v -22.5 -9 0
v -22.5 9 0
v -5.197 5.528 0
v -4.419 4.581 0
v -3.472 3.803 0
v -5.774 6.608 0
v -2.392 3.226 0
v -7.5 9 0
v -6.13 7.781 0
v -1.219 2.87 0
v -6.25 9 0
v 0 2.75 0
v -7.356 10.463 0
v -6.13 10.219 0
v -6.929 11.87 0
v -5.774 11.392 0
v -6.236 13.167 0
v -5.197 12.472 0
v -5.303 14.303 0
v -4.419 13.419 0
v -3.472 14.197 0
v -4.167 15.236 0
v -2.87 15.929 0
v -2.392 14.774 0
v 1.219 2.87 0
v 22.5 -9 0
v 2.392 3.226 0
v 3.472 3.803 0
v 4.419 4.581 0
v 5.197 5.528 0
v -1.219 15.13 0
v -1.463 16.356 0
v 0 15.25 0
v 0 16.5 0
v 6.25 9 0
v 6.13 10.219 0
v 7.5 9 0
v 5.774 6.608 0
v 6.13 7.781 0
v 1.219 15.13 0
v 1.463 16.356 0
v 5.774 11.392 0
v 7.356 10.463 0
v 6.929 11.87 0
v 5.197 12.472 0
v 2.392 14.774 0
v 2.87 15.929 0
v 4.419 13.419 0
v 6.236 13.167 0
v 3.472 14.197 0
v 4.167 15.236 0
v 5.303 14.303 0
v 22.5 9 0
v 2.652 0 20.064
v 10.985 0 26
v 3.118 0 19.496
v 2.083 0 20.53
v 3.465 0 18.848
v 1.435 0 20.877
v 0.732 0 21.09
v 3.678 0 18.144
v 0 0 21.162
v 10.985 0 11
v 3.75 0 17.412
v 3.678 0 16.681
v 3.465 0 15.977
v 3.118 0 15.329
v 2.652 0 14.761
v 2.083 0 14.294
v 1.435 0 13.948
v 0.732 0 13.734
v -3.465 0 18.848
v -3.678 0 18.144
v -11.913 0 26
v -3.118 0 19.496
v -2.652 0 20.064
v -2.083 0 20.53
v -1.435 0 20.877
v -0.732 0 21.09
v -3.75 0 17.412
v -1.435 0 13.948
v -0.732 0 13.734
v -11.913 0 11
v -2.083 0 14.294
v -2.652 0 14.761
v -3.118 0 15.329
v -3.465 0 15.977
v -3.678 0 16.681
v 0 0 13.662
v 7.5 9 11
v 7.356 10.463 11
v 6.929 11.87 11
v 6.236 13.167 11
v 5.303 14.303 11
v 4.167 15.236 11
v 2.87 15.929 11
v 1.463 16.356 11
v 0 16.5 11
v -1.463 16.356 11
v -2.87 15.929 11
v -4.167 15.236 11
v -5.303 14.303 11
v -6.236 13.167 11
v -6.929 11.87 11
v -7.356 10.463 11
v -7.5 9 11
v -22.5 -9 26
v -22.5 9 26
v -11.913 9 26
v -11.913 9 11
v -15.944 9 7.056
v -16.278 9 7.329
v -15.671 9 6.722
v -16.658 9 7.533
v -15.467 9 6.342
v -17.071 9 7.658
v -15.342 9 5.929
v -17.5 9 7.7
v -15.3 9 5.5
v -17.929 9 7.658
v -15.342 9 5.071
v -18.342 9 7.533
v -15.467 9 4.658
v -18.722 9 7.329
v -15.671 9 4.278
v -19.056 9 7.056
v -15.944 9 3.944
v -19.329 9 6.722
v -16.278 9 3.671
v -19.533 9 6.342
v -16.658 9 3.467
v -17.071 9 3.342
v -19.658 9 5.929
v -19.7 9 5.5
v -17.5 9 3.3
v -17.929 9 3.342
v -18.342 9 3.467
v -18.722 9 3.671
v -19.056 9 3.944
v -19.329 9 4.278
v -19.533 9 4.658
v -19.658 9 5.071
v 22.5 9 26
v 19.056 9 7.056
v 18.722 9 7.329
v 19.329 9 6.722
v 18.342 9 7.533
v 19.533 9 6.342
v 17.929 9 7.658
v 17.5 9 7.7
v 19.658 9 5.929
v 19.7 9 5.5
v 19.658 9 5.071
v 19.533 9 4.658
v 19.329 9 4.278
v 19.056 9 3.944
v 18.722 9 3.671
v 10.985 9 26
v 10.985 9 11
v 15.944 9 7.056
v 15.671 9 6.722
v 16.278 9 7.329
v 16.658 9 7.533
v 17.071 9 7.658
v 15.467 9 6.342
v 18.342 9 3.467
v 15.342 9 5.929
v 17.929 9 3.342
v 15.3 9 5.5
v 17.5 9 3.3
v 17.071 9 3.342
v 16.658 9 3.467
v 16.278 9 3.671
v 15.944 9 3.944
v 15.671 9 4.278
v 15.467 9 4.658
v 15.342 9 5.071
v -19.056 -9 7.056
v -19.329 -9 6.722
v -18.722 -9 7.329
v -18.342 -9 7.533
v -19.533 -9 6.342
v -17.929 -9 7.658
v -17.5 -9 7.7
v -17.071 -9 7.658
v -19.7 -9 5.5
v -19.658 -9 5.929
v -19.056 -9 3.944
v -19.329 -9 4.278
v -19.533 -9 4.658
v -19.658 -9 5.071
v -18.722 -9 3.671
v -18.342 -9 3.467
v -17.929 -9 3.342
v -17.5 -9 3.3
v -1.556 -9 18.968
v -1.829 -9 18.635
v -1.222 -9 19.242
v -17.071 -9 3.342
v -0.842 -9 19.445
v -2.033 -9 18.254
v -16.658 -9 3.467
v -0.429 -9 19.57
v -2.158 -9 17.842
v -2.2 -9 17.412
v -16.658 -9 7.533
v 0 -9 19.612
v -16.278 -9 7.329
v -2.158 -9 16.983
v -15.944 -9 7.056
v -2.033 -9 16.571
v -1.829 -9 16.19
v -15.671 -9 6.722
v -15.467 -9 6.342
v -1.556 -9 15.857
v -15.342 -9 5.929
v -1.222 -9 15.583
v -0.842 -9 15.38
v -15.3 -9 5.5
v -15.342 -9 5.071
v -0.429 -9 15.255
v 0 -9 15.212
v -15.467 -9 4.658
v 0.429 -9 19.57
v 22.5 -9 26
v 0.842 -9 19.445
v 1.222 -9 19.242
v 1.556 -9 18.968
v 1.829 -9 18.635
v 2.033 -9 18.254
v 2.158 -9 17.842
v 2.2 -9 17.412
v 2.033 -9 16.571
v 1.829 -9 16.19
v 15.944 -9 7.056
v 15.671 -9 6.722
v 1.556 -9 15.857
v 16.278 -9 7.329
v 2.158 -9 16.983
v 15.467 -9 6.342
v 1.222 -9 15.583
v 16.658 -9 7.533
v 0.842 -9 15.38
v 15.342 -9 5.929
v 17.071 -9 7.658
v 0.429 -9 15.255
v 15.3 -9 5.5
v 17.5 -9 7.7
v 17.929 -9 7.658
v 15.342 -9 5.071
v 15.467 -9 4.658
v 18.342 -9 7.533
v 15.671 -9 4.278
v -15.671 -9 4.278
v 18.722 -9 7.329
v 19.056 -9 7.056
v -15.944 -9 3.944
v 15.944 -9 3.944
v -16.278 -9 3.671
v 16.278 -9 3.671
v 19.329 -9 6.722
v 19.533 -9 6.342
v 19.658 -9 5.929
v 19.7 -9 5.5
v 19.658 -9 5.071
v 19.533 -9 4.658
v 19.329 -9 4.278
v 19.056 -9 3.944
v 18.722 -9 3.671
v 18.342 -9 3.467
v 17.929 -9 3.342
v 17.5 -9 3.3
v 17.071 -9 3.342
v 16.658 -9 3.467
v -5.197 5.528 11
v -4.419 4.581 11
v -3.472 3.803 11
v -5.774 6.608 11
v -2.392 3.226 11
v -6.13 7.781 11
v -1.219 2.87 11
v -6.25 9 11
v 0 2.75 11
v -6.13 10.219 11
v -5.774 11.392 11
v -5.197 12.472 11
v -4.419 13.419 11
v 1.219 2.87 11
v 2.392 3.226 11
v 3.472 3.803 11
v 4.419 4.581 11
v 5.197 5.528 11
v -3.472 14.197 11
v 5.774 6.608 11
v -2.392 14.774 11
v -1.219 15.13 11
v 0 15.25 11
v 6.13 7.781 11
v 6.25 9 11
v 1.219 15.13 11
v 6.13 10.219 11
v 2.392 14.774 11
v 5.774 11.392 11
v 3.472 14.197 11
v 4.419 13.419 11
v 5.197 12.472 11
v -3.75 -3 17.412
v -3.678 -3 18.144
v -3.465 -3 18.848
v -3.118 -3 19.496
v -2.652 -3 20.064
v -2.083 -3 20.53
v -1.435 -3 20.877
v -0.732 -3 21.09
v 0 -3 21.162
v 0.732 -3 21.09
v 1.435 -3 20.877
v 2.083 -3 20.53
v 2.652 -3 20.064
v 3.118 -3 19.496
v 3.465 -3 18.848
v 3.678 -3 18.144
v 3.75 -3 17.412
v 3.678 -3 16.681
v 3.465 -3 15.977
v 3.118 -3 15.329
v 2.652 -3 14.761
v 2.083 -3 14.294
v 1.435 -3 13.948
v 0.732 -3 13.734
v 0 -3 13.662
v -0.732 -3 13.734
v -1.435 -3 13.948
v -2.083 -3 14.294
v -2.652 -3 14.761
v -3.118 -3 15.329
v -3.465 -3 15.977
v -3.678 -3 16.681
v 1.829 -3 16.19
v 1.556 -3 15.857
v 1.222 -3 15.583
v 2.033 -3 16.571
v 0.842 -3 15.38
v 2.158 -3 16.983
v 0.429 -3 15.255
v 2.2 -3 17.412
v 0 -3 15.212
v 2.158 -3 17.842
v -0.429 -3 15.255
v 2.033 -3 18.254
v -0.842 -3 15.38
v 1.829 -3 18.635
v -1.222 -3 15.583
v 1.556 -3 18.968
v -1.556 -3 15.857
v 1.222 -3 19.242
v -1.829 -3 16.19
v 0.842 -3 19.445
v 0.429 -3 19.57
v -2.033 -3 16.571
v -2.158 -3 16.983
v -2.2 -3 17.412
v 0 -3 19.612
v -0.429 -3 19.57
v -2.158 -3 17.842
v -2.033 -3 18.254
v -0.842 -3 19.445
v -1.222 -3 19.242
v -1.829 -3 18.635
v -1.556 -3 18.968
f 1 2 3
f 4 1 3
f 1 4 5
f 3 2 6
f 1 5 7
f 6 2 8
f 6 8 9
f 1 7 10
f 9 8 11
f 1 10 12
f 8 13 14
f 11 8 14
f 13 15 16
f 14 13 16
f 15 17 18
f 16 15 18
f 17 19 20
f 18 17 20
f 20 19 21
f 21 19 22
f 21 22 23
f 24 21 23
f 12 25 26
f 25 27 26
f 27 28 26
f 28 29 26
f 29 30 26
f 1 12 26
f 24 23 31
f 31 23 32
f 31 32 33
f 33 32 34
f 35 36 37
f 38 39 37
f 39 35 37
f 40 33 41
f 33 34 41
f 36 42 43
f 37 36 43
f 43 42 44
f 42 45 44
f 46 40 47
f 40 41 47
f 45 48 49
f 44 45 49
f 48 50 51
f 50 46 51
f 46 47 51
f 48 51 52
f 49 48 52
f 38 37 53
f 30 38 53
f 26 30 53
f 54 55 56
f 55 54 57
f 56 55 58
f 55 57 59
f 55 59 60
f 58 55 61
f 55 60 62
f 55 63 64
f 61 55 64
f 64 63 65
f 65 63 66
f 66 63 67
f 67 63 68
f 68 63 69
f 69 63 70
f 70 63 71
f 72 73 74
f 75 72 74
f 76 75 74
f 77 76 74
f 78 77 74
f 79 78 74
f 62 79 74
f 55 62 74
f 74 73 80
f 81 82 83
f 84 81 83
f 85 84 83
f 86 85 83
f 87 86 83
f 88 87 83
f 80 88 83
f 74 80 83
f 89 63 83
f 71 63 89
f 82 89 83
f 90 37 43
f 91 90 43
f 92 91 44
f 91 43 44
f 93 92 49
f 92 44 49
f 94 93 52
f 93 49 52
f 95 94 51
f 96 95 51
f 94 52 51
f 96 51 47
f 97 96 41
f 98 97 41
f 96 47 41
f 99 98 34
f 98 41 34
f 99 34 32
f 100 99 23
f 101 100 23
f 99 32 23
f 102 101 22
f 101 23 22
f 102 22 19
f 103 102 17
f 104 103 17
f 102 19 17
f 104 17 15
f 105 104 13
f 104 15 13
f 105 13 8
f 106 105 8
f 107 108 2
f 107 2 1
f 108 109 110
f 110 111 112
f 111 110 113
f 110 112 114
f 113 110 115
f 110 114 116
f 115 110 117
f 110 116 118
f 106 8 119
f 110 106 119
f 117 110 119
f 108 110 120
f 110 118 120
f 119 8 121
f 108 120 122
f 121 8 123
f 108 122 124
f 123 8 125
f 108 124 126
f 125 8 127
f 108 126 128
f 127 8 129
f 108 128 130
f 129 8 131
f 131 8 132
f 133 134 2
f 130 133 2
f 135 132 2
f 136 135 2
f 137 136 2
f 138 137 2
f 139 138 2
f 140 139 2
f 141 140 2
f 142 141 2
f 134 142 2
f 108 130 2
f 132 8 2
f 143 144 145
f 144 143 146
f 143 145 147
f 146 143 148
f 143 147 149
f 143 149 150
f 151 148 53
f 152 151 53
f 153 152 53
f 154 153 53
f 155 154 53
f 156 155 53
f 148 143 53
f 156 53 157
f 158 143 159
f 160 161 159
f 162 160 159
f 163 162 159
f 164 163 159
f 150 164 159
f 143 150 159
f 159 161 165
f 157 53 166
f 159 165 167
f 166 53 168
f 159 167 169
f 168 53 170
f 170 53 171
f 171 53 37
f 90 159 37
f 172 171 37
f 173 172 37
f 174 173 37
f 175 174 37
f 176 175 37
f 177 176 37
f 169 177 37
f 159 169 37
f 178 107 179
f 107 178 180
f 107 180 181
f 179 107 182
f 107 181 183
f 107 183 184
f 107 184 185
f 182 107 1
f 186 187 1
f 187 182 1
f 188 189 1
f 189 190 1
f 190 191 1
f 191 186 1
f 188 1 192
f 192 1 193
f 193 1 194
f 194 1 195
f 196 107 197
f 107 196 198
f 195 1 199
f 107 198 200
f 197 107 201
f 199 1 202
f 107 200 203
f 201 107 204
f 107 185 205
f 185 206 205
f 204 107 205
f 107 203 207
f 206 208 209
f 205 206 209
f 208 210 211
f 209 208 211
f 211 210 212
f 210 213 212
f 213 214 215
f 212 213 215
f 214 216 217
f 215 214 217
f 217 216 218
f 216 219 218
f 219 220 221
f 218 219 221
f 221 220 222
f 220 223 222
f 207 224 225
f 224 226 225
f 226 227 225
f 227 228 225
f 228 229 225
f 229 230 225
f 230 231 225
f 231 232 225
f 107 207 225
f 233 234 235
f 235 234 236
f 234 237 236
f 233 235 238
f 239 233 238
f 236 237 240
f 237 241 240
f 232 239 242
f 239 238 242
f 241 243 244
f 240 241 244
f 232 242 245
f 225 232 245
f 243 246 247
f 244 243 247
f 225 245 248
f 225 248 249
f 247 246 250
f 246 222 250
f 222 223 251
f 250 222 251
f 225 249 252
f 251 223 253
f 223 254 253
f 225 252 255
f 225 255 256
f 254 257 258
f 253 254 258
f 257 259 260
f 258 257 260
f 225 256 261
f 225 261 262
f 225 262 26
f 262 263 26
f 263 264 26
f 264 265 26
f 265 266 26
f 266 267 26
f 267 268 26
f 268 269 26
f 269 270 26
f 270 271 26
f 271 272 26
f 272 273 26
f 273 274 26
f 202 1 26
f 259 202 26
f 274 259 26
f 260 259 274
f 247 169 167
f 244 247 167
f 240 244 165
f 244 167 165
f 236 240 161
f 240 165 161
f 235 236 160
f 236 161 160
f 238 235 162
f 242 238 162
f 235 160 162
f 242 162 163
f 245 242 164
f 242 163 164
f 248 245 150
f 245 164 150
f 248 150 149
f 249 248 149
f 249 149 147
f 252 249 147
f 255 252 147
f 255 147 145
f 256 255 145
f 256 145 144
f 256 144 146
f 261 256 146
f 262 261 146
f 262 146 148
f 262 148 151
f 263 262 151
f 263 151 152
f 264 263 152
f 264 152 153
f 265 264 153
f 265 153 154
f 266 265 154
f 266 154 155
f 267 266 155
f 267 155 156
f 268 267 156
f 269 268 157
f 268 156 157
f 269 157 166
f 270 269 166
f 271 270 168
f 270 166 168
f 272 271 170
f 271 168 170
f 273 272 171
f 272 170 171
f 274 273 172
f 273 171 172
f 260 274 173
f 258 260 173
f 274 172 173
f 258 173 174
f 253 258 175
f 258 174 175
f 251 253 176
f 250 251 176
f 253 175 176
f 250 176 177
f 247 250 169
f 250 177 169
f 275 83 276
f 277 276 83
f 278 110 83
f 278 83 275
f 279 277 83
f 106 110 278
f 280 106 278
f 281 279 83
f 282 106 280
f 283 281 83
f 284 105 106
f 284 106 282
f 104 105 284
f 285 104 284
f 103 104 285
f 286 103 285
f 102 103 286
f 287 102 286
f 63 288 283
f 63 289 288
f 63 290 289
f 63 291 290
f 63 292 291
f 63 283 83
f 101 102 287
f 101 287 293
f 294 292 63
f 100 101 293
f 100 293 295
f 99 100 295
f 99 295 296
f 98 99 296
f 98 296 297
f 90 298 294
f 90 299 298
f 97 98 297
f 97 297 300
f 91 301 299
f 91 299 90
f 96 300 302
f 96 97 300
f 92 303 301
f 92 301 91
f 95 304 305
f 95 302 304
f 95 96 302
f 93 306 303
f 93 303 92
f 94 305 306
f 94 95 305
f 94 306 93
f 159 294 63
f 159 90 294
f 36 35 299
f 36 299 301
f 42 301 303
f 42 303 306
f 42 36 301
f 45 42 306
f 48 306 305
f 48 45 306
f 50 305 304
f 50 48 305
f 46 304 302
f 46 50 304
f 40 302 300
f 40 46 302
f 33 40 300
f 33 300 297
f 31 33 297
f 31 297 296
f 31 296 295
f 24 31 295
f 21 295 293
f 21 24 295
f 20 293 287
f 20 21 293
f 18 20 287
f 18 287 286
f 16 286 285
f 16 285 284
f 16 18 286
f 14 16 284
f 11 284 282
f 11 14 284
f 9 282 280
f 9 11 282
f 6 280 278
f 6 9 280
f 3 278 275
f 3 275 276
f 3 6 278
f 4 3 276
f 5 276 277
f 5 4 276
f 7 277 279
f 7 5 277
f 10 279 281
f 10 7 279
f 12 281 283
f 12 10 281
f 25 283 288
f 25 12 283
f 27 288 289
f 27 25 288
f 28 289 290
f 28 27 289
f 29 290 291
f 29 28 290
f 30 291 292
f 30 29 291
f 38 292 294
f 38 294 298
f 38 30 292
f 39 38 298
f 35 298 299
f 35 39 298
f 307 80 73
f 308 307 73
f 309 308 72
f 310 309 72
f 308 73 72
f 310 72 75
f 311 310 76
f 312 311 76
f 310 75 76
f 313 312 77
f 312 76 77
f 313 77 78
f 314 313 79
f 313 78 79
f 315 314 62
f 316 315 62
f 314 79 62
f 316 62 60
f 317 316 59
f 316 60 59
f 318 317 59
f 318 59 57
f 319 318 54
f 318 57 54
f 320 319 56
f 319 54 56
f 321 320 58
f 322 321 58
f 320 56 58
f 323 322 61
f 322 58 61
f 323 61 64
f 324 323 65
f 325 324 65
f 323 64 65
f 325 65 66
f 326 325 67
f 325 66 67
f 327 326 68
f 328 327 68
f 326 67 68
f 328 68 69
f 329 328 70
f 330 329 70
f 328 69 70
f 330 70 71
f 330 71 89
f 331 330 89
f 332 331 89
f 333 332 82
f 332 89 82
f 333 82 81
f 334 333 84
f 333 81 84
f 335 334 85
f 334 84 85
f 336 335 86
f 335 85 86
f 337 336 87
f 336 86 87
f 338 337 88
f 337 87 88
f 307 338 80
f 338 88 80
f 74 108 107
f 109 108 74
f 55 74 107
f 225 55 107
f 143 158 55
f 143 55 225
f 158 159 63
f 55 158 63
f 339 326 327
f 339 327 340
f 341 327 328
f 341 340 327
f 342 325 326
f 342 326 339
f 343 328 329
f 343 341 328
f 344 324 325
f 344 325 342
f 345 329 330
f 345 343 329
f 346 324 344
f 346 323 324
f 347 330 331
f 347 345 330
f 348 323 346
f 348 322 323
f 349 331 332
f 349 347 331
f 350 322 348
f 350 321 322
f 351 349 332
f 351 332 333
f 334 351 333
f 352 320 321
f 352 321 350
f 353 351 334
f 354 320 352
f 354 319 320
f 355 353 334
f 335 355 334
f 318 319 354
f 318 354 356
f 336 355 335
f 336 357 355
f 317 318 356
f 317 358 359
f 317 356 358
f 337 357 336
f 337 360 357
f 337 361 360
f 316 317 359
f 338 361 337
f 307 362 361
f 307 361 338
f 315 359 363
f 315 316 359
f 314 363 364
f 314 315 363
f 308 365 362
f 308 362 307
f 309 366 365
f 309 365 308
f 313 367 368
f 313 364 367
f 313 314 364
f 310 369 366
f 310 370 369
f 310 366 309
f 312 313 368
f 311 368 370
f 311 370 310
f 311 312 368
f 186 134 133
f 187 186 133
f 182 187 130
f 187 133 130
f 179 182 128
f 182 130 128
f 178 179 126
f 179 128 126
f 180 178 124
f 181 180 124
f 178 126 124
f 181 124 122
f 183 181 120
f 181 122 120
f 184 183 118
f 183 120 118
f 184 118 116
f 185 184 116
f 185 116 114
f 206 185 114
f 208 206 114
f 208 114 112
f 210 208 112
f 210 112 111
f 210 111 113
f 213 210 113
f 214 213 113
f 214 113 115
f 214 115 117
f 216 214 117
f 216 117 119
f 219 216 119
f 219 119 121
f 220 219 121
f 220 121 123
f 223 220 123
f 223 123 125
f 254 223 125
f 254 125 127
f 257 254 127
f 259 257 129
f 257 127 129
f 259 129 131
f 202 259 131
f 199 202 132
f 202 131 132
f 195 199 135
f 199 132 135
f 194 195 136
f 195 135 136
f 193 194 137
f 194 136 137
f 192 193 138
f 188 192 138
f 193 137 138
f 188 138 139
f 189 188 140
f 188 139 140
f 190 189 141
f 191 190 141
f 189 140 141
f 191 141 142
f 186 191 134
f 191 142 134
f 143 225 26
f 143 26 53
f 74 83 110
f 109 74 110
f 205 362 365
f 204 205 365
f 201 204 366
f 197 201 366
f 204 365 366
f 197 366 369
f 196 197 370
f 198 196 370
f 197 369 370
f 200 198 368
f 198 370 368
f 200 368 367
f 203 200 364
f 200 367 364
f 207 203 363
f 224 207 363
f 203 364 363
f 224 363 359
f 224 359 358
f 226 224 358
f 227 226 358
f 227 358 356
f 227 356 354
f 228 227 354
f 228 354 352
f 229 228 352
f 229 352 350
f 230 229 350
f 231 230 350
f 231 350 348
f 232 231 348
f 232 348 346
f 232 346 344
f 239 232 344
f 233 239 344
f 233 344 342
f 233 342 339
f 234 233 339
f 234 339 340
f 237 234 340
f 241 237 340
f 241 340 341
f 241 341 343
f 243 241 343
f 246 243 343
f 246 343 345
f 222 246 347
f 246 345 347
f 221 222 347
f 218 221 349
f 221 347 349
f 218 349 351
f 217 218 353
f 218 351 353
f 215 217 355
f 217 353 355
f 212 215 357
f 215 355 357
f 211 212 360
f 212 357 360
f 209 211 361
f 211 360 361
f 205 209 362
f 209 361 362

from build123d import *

# Parameters (mm, degrees)
F0_R      = 6.25
F1_DEPTH  = 11
F2_R      = 2.2
F3_DEPTH  = 18.001
F5_DEPTH  = 15
F6_R      = 3.75
F6_R_2    = 2.2
F7_DEPTH  = 3
F7_FACE_R = 2.2
F8_DEPTH  = 9.001


with BuildPart() as f1:
    # F0 (on Top) → F1 (new body)
    with BuildSketch(Plane.XY):
        with BuildLine():
            Line((-7.5, 9), (-22.5, 9))
            Line((-22.5, 9), (-22.5, -9))
            Line((-22.5, -9), (22.5, -9))
            Line((22.5, -9), (22.5, 9))
            Line((22.5, 9), (7.5, 9))
            ThreePointArc((7.5, 9), (0, 1.5), (-7.5, 9))
        make_face()
        with BuildLine():
            ThreePointArc((7.5, 9), (0, 16.5), (-7.5, 9))
            ThreePointArc((-7.5, 9), (0, 1.5), (7.5, 9))
        make_face()
        with Locations((0, 9)):
            Circle(F0_R, mode=Mode.SUBTRACT)
    extrude(amount=F1_DEPTH)

    # F2 (on face) → F3 (cut, through all)
    with BuildSketch(Plane(origin=(0, 9, 0), x_dir=(-1, 0, 0), z_dir=(0, 1, 0))):
        with Locations((17.5, 5.5)):
            Circle(F2_R)
        with Locations((-17.5, 5.5)):
            Circle(F2_R)
    extrude(amount=-F3_DEPTH, mode=Mode.SUBTRACT)

    # F4 (on face) → F5 (join)
    with BuildSketch(Plane.XY.offset(11)):
        Polygon((-11.913064, 9), (-22.5, 9), (-22.5, -9), (22.5, -9), (22.5, 9), (10.984777, 9), (10.984777, 0), (-11.913064, 0), align=None)
    extrude(amount=F5_DEPTH)

    # F6 (on face) → F7 (cut)
    with BuildSketch(Plane(origin=(0, 0, 0), x_dir=(-1, 0, 0), z_dir=(0, 1, 0))):
        with Locations((0, 17.412443)):
            Circle(F6_R)
        with Locations((0, 17.412443)):
            Circle(F6_R_2, mode=Mode.SUBTRACT)
    extrude(amount=-F7_DEPTH, mode=Mode.SUBTRACT)

    # F7_face (on face) → F8 (cut, through all)
    with BuildSketch(Plane(origin=(0, 0, 17.412443), x_dir=(-1, 0, 0), z_dir=(0, 1, 0))):
        Circle(F7_FACE_R)
    extrude(amount=-F8_DEPTH, mode=Mode.SUBTRACT)


solid = f1.part
